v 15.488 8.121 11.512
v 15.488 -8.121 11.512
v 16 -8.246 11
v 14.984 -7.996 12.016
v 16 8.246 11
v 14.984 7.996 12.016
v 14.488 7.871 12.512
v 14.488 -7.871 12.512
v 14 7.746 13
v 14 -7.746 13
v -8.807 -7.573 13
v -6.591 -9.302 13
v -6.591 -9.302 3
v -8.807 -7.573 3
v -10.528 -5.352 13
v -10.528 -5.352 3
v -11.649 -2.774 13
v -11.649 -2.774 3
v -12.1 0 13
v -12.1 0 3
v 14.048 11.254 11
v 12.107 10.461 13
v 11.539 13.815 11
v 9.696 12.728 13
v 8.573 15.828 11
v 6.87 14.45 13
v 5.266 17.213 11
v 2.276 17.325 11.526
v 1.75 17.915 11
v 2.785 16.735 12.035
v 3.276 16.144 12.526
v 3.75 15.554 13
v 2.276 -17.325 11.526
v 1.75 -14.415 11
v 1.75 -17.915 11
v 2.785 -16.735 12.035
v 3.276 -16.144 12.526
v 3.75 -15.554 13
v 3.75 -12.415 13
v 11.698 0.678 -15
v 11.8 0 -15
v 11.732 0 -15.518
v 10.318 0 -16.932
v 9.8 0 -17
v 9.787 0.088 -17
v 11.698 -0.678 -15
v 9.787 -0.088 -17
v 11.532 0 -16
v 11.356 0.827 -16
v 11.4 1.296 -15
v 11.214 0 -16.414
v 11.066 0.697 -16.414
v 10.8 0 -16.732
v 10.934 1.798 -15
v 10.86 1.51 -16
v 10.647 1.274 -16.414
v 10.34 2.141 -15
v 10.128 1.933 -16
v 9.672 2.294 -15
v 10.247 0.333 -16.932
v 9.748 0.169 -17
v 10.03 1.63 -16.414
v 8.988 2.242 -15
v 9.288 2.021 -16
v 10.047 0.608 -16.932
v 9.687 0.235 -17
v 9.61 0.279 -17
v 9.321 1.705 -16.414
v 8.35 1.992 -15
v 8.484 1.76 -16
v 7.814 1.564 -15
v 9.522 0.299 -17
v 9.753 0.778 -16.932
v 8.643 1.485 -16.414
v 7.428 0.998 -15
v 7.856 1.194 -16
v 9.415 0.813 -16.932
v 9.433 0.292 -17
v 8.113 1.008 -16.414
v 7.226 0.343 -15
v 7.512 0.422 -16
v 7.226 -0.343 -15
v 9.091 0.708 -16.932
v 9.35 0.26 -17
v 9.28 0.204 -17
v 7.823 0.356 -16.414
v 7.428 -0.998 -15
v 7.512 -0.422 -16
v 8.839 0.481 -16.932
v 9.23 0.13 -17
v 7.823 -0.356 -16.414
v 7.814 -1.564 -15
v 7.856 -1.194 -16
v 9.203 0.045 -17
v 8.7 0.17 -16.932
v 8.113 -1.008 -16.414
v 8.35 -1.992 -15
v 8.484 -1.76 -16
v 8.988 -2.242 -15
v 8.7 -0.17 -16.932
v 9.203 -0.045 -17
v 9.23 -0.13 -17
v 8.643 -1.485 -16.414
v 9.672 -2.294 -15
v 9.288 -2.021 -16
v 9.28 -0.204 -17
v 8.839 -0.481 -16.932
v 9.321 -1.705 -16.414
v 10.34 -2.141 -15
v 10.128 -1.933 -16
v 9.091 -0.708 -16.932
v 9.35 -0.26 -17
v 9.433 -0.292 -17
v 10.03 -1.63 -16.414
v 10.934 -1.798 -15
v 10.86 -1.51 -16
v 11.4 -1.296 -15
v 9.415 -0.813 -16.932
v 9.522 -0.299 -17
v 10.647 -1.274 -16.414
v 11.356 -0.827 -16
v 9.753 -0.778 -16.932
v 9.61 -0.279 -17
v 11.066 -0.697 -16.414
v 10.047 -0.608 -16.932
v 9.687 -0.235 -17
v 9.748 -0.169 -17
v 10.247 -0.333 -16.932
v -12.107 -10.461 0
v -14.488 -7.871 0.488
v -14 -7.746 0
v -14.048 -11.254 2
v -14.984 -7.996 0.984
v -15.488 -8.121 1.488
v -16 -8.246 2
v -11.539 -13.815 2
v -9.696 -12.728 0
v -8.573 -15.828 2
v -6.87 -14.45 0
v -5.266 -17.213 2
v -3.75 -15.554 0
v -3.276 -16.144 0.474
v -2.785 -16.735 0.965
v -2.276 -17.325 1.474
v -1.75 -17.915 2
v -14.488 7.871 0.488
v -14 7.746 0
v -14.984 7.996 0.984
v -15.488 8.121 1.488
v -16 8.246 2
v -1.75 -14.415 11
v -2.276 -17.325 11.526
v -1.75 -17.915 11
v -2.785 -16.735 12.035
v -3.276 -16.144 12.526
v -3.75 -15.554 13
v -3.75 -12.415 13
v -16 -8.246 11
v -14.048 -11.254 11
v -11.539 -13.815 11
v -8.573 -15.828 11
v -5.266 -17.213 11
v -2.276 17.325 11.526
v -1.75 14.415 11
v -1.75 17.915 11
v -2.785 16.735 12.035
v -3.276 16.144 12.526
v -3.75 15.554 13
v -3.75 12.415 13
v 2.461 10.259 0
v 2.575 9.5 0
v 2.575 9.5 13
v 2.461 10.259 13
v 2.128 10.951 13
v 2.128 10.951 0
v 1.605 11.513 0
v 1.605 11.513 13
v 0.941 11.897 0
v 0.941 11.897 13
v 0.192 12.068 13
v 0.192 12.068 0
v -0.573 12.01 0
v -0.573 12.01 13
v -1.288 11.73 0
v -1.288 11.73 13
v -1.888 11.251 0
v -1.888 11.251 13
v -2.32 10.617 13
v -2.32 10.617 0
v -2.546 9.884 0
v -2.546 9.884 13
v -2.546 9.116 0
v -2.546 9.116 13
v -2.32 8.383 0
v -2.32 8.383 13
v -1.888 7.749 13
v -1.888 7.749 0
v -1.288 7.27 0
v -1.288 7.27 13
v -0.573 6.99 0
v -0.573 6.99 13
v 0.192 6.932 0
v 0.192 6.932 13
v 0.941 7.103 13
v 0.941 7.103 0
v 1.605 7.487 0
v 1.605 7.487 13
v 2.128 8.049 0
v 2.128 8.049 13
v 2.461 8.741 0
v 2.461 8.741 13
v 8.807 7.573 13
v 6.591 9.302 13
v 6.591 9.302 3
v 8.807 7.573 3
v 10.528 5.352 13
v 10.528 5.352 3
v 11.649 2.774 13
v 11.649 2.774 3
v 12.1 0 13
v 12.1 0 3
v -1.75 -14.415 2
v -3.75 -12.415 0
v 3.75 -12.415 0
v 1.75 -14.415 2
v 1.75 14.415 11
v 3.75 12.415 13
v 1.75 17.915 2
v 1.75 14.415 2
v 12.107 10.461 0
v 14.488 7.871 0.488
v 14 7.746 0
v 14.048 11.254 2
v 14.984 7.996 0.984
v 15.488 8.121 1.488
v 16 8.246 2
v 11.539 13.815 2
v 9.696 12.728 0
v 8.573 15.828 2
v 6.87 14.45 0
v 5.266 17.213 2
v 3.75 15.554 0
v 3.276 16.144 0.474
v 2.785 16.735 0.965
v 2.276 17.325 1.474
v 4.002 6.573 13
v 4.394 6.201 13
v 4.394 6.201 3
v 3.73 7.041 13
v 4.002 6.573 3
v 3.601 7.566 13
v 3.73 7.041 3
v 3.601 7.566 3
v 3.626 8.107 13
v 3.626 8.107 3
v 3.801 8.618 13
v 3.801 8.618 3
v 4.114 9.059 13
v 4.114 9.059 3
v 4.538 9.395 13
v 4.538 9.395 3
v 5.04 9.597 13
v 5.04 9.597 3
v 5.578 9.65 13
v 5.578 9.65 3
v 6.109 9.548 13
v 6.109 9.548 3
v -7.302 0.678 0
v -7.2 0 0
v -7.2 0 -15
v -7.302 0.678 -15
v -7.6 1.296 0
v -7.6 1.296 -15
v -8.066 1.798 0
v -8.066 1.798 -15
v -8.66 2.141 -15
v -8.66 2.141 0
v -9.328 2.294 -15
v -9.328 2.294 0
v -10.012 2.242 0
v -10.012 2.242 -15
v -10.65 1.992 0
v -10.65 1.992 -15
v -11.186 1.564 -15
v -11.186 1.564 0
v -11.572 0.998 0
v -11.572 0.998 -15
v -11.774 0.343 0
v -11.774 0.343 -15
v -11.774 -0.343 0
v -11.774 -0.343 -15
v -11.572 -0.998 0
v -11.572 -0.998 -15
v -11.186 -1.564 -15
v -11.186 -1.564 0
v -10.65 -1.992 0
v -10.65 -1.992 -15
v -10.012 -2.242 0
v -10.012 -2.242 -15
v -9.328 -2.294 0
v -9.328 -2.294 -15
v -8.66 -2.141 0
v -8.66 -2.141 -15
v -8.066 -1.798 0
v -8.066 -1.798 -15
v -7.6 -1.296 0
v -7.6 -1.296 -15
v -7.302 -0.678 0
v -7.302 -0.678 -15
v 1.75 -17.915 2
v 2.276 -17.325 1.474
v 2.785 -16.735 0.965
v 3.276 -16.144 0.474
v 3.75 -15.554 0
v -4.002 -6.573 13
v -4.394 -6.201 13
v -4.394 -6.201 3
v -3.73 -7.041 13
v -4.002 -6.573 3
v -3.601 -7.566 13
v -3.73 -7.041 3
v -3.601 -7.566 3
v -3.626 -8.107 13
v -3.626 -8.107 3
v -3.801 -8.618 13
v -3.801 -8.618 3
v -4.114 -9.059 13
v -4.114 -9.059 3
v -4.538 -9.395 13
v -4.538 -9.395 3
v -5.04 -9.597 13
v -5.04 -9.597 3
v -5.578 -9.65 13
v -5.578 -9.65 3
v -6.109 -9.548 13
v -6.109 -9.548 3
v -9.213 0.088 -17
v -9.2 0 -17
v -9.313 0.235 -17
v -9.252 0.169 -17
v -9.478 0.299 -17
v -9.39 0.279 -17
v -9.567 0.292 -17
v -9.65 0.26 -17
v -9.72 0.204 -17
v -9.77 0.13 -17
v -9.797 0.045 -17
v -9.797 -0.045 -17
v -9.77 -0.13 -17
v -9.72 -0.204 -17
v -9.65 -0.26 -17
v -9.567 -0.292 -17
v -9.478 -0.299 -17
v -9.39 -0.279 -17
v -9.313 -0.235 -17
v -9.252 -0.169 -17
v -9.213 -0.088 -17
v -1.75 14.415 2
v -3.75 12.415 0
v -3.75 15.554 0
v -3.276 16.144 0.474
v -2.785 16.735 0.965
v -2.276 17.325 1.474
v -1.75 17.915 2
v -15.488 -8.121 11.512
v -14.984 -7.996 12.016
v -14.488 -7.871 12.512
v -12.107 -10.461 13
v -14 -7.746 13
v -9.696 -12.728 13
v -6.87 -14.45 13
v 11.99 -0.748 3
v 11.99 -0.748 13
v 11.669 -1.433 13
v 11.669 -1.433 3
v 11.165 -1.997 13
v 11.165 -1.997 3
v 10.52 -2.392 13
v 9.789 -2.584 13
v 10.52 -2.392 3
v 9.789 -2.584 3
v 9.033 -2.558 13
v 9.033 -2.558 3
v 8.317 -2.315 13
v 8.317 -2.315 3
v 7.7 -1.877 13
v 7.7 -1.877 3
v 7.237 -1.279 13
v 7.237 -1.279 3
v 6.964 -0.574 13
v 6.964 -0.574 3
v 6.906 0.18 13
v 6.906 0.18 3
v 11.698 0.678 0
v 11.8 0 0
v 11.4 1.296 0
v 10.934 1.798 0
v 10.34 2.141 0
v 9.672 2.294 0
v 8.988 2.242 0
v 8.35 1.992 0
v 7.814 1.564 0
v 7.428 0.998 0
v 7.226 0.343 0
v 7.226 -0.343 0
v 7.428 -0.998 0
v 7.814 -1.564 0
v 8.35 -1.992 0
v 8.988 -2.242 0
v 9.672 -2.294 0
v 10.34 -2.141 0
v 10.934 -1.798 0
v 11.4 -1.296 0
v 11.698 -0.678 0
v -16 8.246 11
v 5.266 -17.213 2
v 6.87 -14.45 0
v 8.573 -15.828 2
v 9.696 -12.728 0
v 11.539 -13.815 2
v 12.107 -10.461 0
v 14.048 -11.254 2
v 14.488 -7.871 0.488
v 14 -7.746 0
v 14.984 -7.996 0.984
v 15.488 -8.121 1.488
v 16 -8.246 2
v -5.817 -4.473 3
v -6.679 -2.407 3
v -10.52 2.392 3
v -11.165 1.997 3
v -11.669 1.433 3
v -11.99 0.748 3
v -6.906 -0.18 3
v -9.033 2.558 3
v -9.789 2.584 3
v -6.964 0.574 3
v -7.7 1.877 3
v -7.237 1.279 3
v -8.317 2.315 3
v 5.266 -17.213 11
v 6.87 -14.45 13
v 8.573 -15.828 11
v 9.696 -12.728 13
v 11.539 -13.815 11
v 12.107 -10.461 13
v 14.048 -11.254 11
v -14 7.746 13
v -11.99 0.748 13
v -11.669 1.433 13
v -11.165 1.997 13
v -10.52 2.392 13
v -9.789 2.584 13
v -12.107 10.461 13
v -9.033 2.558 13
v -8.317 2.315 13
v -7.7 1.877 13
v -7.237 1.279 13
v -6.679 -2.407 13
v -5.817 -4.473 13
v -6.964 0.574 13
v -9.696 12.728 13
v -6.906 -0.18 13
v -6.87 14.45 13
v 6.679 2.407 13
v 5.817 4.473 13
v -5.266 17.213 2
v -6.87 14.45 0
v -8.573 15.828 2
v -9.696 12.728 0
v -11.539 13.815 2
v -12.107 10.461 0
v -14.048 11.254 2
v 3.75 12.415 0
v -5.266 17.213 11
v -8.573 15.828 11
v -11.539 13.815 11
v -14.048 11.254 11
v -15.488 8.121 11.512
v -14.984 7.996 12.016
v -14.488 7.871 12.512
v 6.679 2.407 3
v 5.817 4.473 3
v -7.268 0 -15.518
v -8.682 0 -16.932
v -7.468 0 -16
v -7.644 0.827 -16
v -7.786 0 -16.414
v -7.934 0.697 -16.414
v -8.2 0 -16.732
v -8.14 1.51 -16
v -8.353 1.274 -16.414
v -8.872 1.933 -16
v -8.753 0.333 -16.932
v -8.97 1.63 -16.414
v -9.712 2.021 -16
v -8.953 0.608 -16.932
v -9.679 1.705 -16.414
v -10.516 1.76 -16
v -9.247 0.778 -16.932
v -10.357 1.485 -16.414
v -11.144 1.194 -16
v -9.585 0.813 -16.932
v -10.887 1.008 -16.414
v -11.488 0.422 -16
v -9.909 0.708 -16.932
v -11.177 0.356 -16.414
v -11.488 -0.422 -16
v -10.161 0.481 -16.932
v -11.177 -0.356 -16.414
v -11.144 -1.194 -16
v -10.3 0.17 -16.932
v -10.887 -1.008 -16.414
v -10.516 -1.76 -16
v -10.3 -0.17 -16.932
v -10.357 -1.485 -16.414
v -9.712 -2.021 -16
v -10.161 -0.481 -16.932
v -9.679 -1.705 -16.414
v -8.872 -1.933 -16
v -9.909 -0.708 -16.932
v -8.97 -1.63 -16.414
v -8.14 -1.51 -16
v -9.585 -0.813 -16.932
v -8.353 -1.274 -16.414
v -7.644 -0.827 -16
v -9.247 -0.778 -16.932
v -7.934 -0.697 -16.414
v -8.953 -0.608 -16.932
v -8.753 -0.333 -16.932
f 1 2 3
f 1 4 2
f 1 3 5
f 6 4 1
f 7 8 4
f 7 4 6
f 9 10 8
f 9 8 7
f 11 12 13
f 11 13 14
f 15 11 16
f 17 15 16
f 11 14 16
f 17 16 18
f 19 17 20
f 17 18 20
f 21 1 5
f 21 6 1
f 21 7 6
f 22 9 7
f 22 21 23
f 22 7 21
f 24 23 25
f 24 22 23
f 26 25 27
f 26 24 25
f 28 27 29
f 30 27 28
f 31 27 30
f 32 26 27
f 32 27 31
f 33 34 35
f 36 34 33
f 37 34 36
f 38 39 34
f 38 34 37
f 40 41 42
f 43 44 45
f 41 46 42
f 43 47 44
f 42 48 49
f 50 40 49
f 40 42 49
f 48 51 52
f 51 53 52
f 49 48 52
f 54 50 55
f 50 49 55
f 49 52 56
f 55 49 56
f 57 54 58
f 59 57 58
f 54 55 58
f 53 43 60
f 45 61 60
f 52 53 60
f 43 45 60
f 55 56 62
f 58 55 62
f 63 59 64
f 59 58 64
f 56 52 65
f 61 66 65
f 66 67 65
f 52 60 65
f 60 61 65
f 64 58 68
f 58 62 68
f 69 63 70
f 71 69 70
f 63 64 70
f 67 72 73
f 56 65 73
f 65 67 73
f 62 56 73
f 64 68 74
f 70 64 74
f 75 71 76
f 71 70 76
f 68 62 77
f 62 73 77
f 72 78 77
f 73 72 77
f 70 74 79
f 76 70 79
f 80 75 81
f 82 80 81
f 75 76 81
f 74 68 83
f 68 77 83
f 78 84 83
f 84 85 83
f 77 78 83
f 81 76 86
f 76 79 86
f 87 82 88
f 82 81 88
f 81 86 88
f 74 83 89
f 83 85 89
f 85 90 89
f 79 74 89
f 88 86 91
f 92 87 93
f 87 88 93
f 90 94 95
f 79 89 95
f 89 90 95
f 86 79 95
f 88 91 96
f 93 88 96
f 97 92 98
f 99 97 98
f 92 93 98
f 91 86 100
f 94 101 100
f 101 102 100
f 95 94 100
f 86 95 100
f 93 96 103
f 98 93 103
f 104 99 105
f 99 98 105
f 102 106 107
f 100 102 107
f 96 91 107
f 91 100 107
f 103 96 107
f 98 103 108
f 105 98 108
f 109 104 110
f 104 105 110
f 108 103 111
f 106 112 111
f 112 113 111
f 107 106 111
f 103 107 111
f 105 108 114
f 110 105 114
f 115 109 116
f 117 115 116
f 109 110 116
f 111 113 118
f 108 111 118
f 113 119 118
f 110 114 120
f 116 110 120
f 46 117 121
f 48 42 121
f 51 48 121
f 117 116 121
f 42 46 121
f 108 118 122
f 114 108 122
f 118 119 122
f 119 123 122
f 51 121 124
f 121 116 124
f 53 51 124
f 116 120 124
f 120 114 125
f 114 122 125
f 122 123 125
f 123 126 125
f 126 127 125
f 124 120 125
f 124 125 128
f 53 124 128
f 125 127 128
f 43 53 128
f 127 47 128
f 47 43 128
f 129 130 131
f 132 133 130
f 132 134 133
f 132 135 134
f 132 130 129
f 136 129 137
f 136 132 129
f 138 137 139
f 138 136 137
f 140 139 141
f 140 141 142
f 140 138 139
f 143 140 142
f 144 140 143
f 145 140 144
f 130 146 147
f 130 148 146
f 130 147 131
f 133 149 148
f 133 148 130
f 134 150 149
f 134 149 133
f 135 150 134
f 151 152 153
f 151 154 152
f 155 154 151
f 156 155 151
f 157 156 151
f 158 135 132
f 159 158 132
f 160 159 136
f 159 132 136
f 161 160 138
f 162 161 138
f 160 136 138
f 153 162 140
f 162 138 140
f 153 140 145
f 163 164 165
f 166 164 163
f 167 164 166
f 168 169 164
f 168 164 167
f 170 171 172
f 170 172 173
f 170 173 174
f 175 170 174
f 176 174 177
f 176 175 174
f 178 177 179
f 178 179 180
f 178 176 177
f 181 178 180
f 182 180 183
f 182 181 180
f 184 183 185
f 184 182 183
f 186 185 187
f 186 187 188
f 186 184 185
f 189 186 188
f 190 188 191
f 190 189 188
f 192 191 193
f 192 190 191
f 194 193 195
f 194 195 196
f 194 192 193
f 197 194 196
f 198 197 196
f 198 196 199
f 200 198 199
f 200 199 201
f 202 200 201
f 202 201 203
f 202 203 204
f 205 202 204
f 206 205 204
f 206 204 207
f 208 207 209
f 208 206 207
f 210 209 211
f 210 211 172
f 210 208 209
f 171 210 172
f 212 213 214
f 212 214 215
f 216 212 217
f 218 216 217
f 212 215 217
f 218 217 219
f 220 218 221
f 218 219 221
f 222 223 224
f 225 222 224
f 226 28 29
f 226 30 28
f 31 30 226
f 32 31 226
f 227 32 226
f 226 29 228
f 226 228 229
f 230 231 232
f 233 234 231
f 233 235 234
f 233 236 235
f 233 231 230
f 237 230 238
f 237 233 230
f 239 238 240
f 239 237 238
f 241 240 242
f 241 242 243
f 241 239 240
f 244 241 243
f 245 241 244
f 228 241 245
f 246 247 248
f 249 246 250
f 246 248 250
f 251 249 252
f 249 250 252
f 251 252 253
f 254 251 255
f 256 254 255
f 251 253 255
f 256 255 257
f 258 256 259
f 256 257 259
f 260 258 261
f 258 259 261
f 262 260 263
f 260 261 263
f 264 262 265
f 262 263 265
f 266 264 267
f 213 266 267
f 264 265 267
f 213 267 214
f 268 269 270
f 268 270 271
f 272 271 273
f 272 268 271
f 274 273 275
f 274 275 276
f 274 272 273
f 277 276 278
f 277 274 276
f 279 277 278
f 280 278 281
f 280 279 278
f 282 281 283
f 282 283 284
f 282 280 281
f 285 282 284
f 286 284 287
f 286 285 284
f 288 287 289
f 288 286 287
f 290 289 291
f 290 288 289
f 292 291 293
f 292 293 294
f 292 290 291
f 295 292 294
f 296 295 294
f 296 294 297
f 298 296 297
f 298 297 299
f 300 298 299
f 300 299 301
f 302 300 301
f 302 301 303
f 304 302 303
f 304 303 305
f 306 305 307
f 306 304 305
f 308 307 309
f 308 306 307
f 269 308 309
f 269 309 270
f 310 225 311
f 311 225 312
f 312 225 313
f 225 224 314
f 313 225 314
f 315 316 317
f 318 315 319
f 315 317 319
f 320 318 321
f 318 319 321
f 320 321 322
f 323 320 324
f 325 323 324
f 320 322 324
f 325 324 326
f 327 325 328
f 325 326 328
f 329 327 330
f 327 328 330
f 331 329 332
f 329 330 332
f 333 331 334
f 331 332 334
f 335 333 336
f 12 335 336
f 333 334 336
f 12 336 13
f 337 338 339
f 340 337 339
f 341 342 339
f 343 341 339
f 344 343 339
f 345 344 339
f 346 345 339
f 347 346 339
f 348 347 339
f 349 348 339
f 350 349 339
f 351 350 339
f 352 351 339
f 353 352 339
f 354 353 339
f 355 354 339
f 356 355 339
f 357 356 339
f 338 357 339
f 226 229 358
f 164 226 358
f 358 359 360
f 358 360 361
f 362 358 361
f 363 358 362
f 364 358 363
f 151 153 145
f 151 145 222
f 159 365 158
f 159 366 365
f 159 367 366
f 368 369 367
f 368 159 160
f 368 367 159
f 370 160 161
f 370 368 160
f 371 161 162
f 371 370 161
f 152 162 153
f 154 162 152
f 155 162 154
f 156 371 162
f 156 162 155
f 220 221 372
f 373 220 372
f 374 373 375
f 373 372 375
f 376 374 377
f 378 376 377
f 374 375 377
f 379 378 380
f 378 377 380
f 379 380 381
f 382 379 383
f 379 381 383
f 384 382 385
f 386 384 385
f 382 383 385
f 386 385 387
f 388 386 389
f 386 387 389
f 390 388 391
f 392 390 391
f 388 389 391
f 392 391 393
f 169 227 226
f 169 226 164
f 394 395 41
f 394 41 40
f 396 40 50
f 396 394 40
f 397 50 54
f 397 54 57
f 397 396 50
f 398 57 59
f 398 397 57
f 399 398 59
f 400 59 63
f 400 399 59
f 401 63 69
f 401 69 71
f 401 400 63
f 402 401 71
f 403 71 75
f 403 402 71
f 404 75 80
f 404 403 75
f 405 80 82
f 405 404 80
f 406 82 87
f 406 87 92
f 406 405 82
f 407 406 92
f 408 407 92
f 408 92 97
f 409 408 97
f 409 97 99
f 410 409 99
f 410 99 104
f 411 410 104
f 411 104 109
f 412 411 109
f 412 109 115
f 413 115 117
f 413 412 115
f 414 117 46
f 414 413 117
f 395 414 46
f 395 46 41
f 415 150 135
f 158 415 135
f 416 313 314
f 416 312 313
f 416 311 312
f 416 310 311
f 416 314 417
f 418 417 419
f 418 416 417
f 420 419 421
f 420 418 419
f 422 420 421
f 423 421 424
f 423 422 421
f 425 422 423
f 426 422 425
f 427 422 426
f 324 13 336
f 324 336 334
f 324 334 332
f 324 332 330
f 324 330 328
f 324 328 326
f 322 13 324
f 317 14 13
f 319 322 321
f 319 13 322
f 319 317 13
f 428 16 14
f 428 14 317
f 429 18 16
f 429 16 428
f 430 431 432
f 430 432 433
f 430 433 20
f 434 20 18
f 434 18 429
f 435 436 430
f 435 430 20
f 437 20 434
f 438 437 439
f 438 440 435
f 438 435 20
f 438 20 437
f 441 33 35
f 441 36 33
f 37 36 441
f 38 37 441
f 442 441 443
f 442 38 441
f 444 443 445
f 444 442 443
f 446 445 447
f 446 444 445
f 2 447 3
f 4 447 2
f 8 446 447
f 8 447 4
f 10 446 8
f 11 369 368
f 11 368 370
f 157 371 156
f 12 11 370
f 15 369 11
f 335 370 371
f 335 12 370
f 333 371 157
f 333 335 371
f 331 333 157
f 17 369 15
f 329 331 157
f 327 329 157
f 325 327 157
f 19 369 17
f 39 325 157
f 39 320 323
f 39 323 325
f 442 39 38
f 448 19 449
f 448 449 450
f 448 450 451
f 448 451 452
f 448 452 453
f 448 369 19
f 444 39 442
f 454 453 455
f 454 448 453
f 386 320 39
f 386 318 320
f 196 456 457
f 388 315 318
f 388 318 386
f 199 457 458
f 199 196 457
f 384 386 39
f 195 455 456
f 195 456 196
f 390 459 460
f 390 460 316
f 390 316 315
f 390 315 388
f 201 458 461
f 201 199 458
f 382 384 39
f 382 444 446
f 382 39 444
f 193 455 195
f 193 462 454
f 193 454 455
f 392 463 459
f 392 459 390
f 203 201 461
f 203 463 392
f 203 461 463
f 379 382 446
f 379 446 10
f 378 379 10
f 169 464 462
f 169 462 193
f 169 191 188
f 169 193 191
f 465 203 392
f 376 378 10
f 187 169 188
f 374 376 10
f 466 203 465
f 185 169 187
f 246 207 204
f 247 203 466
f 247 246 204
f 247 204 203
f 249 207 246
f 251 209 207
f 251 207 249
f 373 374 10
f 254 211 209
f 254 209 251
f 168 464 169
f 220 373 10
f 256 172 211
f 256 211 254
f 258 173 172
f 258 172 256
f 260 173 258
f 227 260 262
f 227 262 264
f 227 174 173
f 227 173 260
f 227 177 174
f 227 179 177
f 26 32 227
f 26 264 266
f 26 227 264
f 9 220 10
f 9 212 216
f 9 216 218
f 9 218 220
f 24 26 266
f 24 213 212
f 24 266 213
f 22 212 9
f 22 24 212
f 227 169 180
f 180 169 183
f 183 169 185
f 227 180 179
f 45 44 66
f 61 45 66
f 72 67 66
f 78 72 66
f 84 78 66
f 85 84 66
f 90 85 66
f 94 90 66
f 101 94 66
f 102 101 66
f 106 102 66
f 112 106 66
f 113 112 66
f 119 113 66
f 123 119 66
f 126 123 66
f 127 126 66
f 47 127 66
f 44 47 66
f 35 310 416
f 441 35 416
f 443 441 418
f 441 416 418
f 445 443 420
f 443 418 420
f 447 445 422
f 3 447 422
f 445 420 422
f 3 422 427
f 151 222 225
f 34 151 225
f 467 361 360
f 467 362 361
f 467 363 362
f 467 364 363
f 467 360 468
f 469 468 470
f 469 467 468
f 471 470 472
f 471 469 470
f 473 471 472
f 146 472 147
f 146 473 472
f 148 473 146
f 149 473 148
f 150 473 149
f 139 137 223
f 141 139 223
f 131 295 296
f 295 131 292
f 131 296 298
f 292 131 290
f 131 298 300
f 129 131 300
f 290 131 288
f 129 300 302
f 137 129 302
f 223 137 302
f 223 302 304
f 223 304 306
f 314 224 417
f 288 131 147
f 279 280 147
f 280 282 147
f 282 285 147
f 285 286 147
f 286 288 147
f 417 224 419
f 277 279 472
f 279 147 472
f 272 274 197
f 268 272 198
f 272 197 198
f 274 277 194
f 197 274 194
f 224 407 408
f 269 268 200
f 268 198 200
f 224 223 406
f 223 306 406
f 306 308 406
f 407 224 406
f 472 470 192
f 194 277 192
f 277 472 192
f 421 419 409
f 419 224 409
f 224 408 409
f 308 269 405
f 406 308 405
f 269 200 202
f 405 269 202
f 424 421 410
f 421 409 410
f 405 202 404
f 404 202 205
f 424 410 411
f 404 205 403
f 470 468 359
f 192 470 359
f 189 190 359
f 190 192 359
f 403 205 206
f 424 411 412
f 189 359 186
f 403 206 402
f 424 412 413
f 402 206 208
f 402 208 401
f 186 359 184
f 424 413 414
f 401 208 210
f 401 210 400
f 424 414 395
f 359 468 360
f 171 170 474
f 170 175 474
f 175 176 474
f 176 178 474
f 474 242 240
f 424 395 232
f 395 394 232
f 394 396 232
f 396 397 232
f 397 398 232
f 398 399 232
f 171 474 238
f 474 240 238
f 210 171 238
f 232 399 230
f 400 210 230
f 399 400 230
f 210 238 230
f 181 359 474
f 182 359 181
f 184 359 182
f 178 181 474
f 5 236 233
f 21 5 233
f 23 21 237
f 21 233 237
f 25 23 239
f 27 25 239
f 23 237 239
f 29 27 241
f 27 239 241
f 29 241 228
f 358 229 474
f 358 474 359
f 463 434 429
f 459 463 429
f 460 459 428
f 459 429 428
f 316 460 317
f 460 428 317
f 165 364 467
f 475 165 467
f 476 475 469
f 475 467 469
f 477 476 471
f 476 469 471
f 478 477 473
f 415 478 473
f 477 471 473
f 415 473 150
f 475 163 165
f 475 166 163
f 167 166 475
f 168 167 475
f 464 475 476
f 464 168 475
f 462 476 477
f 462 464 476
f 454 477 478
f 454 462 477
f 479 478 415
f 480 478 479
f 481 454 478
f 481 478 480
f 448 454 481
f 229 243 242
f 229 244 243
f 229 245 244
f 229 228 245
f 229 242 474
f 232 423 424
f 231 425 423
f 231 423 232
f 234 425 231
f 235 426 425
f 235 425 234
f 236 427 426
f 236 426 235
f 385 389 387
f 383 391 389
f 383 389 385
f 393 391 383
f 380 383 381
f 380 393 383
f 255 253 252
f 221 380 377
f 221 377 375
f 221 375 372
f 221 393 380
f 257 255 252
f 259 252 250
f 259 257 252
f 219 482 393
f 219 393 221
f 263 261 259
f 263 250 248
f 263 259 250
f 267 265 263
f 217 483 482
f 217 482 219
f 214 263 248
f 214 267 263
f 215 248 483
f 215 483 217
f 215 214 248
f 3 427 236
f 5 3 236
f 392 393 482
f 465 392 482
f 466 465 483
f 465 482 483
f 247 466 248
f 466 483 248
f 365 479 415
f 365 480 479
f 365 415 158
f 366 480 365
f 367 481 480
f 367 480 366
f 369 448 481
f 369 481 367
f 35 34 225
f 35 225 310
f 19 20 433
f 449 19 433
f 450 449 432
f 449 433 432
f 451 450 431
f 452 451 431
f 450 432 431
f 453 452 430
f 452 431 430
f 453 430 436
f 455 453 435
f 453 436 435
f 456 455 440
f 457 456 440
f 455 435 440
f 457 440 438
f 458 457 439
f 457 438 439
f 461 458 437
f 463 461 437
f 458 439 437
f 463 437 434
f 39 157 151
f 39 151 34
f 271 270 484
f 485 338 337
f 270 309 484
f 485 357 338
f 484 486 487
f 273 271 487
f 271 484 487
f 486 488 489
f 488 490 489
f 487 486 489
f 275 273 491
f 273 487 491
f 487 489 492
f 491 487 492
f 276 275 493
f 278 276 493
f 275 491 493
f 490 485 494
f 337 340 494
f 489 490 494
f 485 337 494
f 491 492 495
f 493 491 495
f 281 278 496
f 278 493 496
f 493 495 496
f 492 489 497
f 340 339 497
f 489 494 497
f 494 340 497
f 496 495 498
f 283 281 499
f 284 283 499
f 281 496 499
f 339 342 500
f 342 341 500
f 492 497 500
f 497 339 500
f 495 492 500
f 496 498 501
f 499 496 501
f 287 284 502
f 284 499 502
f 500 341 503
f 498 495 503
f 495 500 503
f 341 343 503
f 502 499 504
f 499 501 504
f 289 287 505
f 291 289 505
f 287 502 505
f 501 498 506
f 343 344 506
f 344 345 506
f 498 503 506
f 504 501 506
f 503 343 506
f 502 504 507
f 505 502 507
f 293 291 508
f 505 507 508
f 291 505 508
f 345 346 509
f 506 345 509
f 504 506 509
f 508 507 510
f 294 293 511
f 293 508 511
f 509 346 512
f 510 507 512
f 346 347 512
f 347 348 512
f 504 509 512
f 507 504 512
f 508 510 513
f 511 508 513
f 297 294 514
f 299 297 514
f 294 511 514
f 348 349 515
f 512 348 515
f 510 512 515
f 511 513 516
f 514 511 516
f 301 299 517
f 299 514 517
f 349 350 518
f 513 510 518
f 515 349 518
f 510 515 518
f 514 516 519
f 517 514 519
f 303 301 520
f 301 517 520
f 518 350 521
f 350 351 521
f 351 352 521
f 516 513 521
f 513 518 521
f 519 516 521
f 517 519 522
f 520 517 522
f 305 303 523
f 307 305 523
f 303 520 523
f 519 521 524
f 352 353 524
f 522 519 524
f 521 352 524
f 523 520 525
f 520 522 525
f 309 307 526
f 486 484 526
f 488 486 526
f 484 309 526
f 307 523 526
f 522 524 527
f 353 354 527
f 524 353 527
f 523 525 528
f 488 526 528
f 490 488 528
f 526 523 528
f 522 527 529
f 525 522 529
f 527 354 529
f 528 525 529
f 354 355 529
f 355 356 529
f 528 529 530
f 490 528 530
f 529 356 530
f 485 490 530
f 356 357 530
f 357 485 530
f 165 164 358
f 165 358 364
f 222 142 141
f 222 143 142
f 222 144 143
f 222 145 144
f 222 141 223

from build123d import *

# Parameters (mm, degrees)
F0_R     = 2.575
F1_DEPTH = 13
F0_R_2   = 2.3
F2_DEPTH = 3
F3_DEPTH = 17
F4_R     = 2
F5_SIZE  = 1.99999
F6_SIZE  = 1.99999


# Not quite as in the source:
# - a fillet or chamfer is up to 0.001 mm smaller than in the source, because OpenCascade refuses the exact size


with BuildPart() as f1:
    # F0 (on Top) → F1 (new body)
    with BuildSketch(Plane.XY):
        with BuildLine():
            Line((1.75, -14.4147285773), (1.75, -17.9147285773))
            ThreePointArc((1.75, -17.9147285773), (10.1062199571, -14.895110546), (16, -8.2462112512))
            Line((16, -8.2462112512), (16, 8.2462112512))
            ThreePointArc((16, 8.2462112512), (10.1062199571, 14.895110546), (1.75, 17.9147285773))
            Line((1.75, 17.9147285773), (1.75, 14.4147285773))
            Line((1.75, 14.4147285773), (-1.75, 14.4147285773))
            Line((-1.75, 14.4147285773), (-1.75, 17.9147285773))
            ThreePointArc((-1.75, 17.9147285773), (-10.1062199571, 14.895110546), (-16, 8.2462112512))
            Line((-16, 8.2462112512), (-16, -8.2462112512))
            ThreePointArc((-16, -8.2462112512), (-10.1062199571, -14.895110546), (-1.75, -17.9147285773))
            Line((-1.75, -17.9147285773), (-1.75, -14.4147285773))
            Line((-1.75, -14.4147285773), (1.75, -14.4147285773))
        make_face()
        with BuildLine():
            ThreePointArc((-12.1, 0), (-9.4098118123, 2.5984353159), (-6.9062568532, -0.1802678246))
            ThreePointArc((-6.9062568532, -0.1802678246), (-6.3236870302, -3.4718300474), (-4.3937995375, -6.2011713107))
            ThreePointArc((-4.3937995375, -6.2011713107), (-3.9419565942, -8.8499140227), (-6.5906993063, -9.301756966))
            ThreePointArc((-6.5906993063, -9.301756966), (-10.5283348632, -5.3515440951), (-12.1, 0))
        make_face(mode=Mode.SUBTRACT)
        with BuildLine():
            ThreePointArc((12.1, 0), (9.4098118123, -2.5984353159), (6.9062568532, 0.1802678246))
            ThreePointArc((6.9062568532, 0.1802678246), (6.3236870302, 3.4718300474), (4.3937995375, 6.2011713107))
            ThreePointArc((4.3937995375, 6.2011713107), (3.9419565942, 8.8499140227), (6.5906993063, 9.301756966))
            ThreePointArc((6.5906993063, 9.301756966), (10.5283348632, 5.3515440951), (12.1, 0))
        make_face(mode=Mode.SUBTRACT)
        with Locations((0, 9.5)):
            Circle(F0_R, mode=Mode.SUBTRACT)
    extrude(amount=F1_DEPTH)

    # F0 (on Top) → F2 (join)
    with BuildSketch(Plane.XY):
        with BuildLine():
            ThreePointArc((-4.3937995375, -6.2011713107), (-6.3236870302, -3.4718300474), (-6.9062568532, -0.1802678246))
            ThreePointArc((-6.9062568532, -0.1802678246), (-9.4098118123, 2.5984353159), (-12.1, 0))
            ThreePointArc((-12.1, 0), (-10.5283348632, -5.3515440951), (-6.5906993063, -9.301756966))
            ThreePointArc((-6.5906993063, -9.301756966), (-3.9419565942, -8.8499140227), (-4.3937995375, -6.2011713107))
        make_face()
        with Locations((-9.5, 0)):
            Circle(F0_R_2, mode=Mode.SUBTRACT)
        with Locations((-9.5, 0)):
            Circle(F0_R_2)
        with BuildLine():
            ThreePointArc((4.3937995375, 6.2011713107), (6.3236870302, 3.4718300474), (6.9062568532, 0.1802678246))
            ThreePointArc((6.9062568532, 0.1802678246), (9.4098118123, -2.5984353159), (12.1, 0))
            ThreePointArc((12.1, 0), (10.5283348632, 5.3515440951), (6.5906993063, 9.301756966))
            ThreePointArc((6.5906993063, 9.301756966), (3.9419565942, 8.8499140227), (4.3937995375, 6.2011713107))
        make_face()
        with Locations((9.5, 0)):
            Circle(F0_R_2, mode=Mode.SUBTRACT)
        with Locations((9.5, 0)):
            Circle(F0_R_2)
    extrude(amount=F2_DEPTH)

    # F0 (on Top) → F3 (join)
    with BuildSketch(Plane.XY):
        with Locations((-9.5, 0)):
            Circle(F0_R_2)
        with Locations((9.5, 0)):
            Circle(F0_R_2)
    extrude(amount=-F3_DEPTH)

    # F4
    f4_edges = [f1.edges().sort_by_distance(p)[0] for p in [
        (-11.8, 0, -17),
        (7.2, 0, -17),
    ]]
    fillet(f4_edges, radius=F4_R)

    # F5 (size 2 in the source; OpenCascade refuses exactly that, so slightly less here)
    f5_edges = [f1.edges().sort_by_distance(p)[0] for p in [
        (10.10622, 14.895111, 13),
        (16, 0, 13),
        (10.10622, -14.895111, 13),
        (1.75, -16.164729, 13),
        (0, -14.414729, 13),
        (-1.75, -16.164729, 13),
        (-10.10622, -14.895111, 13),
        (-16, 0, 13),
        (-10.10622, 14.895111, 13),
        (-1.75, 16.164729, 13),
        (0, 14.414729, 13),
        (1.75, 16.164729, 13),
    ]]
    chamfer(f5_edges, length=F5_SIZE)

    # F6 (size 2 in the source; OpenCascade refuses exactly that, so slightly less here)
    f6_edges = [f1.edges().sort_by_distance(p)[0] for p in [
        (10.10622, 14.895111, 0),
        (16, 0, 0),
        (10.10622, -14.895111, 0),
        (0, 14.414729, 0),
        (1.75, 16.164729, 0),
        (-1.75, 16.164729, 0),
        (-10.10622, 14.895111, 0),
        (-16, 0, 0),
        (-10.10622, -14.895111, 0),
        (-1.75, -16.164729, 0),
        (0, -14.414729, 0),
        (1.75, -16.164729, 0),
    ]]
    chamfer(f6_edges, length=F6_SIZE)


solid = f1.part
